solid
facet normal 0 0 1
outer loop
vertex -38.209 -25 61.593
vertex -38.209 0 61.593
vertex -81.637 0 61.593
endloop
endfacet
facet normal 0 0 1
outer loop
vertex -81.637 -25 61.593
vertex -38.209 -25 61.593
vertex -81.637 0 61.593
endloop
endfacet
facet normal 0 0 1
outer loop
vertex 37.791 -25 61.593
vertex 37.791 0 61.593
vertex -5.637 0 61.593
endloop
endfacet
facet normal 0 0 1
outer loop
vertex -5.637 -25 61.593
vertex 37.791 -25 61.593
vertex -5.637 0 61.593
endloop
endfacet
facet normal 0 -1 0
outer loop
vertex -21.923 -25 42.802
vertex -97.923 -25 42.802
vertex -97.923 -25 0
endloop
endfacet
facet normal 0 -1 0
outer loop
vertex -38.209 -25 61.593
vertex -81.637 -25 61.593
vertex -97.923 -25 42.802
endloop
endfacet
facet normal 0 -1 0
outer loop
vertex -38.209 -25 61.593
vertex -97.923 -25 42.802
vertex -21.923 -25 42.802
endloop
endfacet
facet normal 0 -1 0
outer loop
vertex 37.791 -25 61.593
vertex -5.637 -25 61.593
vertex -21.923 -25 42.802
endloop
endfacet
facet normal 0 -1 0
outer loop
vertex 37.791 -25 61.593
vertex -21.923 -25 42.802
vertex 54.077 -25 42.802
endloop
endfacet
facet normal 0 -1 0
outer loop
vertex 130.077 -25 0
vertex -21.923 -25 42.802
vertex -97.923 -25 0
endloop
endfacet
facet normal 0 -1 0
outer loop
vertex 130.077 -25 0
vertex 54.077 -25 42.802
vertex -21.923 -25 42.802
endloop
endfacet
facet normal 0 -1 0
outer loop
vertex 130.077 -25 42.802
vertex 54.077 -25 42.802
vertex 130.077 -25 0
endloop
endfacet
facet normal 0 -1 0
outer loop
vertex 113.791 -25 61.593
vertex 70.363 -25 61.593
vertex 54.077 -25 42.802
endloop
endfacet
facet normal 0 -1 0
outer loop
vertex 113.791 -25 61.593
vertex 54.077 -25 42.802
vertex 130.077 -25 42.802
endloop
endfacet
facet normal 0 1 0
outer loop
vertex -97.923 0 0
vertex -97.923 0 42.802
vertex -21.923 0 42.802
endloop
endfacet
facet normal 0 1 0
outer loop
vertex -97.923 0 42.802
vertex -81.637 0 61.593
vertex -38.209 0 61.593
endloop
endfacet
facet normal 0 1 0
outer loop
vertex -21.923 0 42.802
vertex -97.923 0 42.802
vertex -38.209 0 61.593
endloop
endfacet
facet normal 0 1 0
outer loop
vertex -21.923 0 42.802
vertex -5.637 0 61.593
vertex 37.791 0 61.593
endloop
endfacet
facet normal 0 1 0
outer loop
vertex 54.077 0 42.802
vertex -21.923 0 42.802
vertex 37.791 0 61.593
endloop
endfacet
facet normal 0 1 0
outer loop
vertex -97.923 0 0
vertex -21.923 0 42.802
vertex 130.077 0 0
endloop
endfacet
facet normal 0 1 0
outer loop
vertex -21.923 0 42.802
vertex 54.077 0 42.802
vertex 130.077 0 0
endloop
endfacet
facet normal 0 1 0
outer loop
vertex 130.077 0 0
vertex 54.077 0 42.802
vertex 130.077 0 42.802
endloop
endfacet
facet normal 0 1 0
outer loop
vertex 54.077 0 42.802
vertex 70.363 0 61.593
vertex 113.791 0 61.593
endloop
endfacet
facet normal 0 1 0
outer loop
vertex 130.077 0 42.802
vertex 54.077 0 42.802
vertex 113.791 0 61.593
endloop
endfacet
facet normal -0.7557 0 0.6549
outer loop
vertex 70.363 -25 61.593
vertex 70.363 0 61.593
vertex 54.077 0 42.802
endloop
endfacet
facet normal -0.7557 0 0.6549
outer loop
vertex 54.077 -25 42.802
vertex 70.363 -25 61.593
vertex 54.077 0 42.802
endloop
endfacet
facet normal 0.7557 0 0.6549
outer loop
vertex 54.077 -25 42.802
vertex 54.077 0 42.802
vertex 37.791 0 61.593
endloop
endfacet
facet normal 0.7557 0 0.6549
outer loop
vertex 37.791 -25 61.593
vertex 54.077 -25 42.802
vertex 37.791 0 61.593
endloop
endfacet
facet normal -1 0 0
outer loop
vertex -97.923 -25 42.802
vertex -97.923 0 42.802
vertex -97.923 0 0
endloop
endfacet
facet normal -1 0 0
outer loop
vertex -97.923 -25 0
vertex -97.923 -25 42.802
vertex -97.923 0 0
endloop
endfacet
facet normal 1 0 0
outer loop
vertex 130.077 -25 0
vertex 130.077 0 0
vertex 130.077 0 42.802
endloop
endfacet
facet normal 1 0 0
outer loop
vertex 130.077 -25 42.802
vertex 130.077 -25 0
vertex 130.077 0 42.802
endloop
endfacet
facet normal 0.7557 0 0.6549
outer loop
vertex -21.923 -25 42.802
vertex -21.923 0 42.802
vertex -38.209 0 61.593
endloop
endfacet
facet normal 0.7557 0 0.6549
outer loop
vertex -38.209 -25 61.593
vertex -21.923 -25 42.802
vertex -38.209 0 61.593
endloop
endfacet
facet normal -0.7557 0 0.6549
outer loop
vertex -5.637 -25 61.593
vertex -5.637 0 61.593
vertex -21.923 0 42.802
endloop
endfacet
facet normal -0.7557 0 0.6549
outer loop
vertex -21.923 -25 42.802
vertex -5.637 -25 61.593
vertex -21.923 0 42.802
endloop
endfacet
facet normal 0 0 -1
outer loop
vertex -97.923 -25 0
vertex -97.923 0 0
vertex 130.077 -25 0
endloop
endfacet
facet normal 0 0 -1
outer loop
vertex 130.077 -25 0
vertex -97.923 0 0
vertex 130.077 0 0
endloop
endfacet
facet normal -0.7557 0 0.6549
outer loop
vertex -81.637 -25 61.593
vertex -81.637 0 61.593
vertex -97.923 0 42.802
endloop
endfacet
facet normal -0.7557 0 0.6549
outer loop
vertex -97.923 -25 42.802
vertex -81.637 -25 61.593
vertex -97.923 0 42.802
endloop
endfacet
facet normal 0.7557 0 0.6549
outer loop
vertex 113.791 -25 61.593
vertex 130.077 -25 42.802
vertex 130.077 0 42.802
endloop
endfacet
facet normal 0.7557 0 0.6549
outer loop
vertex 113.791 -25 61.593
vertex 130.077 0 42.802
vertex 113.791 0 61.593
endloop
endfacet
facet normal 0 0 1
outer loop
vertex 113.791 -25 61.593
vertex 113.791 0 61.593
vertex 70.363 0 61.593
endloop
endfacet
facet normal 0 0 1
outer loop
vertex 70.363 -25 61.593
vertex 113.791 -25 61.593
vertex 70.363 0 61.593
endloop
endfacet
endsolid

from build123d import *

# Parameters (mm, degrees)
F1_DEPTH = 25


with BuildPart() as f1:
    # F0 (on Front) → F1 (new body)
    with BuildSketch(Plane.XZ):
        Polygon((-97.923082, 42.802202), (-97.923082, 0), (-66.604404, 0), (-21.923082, 0), (-21.923082, 42.802202), (-38.208792, 61.593413), (-59.923082, 61.593413), (-81.637373, 61.593413), align=None)
        Polygon((-21.923082, 42.802202), (-21.923082, 0), (9.395596, 0), (54.076918, 0), (54.076918, 42.802202), (37.791208, 61.593413), (16.076918, 61.593413), (-5.637373, 61.593413), align=None)
        Polygon((54.076918, 42.802202), (54.076918, 0), (130.076918, 0), (130.076918, 42.802202), (113.791208, 61.593413), (92.076918, 61.593413), (70.362627, 61.593413), align=None)
    extrude(amount=F1_DEPTH)


solid = f1.part
